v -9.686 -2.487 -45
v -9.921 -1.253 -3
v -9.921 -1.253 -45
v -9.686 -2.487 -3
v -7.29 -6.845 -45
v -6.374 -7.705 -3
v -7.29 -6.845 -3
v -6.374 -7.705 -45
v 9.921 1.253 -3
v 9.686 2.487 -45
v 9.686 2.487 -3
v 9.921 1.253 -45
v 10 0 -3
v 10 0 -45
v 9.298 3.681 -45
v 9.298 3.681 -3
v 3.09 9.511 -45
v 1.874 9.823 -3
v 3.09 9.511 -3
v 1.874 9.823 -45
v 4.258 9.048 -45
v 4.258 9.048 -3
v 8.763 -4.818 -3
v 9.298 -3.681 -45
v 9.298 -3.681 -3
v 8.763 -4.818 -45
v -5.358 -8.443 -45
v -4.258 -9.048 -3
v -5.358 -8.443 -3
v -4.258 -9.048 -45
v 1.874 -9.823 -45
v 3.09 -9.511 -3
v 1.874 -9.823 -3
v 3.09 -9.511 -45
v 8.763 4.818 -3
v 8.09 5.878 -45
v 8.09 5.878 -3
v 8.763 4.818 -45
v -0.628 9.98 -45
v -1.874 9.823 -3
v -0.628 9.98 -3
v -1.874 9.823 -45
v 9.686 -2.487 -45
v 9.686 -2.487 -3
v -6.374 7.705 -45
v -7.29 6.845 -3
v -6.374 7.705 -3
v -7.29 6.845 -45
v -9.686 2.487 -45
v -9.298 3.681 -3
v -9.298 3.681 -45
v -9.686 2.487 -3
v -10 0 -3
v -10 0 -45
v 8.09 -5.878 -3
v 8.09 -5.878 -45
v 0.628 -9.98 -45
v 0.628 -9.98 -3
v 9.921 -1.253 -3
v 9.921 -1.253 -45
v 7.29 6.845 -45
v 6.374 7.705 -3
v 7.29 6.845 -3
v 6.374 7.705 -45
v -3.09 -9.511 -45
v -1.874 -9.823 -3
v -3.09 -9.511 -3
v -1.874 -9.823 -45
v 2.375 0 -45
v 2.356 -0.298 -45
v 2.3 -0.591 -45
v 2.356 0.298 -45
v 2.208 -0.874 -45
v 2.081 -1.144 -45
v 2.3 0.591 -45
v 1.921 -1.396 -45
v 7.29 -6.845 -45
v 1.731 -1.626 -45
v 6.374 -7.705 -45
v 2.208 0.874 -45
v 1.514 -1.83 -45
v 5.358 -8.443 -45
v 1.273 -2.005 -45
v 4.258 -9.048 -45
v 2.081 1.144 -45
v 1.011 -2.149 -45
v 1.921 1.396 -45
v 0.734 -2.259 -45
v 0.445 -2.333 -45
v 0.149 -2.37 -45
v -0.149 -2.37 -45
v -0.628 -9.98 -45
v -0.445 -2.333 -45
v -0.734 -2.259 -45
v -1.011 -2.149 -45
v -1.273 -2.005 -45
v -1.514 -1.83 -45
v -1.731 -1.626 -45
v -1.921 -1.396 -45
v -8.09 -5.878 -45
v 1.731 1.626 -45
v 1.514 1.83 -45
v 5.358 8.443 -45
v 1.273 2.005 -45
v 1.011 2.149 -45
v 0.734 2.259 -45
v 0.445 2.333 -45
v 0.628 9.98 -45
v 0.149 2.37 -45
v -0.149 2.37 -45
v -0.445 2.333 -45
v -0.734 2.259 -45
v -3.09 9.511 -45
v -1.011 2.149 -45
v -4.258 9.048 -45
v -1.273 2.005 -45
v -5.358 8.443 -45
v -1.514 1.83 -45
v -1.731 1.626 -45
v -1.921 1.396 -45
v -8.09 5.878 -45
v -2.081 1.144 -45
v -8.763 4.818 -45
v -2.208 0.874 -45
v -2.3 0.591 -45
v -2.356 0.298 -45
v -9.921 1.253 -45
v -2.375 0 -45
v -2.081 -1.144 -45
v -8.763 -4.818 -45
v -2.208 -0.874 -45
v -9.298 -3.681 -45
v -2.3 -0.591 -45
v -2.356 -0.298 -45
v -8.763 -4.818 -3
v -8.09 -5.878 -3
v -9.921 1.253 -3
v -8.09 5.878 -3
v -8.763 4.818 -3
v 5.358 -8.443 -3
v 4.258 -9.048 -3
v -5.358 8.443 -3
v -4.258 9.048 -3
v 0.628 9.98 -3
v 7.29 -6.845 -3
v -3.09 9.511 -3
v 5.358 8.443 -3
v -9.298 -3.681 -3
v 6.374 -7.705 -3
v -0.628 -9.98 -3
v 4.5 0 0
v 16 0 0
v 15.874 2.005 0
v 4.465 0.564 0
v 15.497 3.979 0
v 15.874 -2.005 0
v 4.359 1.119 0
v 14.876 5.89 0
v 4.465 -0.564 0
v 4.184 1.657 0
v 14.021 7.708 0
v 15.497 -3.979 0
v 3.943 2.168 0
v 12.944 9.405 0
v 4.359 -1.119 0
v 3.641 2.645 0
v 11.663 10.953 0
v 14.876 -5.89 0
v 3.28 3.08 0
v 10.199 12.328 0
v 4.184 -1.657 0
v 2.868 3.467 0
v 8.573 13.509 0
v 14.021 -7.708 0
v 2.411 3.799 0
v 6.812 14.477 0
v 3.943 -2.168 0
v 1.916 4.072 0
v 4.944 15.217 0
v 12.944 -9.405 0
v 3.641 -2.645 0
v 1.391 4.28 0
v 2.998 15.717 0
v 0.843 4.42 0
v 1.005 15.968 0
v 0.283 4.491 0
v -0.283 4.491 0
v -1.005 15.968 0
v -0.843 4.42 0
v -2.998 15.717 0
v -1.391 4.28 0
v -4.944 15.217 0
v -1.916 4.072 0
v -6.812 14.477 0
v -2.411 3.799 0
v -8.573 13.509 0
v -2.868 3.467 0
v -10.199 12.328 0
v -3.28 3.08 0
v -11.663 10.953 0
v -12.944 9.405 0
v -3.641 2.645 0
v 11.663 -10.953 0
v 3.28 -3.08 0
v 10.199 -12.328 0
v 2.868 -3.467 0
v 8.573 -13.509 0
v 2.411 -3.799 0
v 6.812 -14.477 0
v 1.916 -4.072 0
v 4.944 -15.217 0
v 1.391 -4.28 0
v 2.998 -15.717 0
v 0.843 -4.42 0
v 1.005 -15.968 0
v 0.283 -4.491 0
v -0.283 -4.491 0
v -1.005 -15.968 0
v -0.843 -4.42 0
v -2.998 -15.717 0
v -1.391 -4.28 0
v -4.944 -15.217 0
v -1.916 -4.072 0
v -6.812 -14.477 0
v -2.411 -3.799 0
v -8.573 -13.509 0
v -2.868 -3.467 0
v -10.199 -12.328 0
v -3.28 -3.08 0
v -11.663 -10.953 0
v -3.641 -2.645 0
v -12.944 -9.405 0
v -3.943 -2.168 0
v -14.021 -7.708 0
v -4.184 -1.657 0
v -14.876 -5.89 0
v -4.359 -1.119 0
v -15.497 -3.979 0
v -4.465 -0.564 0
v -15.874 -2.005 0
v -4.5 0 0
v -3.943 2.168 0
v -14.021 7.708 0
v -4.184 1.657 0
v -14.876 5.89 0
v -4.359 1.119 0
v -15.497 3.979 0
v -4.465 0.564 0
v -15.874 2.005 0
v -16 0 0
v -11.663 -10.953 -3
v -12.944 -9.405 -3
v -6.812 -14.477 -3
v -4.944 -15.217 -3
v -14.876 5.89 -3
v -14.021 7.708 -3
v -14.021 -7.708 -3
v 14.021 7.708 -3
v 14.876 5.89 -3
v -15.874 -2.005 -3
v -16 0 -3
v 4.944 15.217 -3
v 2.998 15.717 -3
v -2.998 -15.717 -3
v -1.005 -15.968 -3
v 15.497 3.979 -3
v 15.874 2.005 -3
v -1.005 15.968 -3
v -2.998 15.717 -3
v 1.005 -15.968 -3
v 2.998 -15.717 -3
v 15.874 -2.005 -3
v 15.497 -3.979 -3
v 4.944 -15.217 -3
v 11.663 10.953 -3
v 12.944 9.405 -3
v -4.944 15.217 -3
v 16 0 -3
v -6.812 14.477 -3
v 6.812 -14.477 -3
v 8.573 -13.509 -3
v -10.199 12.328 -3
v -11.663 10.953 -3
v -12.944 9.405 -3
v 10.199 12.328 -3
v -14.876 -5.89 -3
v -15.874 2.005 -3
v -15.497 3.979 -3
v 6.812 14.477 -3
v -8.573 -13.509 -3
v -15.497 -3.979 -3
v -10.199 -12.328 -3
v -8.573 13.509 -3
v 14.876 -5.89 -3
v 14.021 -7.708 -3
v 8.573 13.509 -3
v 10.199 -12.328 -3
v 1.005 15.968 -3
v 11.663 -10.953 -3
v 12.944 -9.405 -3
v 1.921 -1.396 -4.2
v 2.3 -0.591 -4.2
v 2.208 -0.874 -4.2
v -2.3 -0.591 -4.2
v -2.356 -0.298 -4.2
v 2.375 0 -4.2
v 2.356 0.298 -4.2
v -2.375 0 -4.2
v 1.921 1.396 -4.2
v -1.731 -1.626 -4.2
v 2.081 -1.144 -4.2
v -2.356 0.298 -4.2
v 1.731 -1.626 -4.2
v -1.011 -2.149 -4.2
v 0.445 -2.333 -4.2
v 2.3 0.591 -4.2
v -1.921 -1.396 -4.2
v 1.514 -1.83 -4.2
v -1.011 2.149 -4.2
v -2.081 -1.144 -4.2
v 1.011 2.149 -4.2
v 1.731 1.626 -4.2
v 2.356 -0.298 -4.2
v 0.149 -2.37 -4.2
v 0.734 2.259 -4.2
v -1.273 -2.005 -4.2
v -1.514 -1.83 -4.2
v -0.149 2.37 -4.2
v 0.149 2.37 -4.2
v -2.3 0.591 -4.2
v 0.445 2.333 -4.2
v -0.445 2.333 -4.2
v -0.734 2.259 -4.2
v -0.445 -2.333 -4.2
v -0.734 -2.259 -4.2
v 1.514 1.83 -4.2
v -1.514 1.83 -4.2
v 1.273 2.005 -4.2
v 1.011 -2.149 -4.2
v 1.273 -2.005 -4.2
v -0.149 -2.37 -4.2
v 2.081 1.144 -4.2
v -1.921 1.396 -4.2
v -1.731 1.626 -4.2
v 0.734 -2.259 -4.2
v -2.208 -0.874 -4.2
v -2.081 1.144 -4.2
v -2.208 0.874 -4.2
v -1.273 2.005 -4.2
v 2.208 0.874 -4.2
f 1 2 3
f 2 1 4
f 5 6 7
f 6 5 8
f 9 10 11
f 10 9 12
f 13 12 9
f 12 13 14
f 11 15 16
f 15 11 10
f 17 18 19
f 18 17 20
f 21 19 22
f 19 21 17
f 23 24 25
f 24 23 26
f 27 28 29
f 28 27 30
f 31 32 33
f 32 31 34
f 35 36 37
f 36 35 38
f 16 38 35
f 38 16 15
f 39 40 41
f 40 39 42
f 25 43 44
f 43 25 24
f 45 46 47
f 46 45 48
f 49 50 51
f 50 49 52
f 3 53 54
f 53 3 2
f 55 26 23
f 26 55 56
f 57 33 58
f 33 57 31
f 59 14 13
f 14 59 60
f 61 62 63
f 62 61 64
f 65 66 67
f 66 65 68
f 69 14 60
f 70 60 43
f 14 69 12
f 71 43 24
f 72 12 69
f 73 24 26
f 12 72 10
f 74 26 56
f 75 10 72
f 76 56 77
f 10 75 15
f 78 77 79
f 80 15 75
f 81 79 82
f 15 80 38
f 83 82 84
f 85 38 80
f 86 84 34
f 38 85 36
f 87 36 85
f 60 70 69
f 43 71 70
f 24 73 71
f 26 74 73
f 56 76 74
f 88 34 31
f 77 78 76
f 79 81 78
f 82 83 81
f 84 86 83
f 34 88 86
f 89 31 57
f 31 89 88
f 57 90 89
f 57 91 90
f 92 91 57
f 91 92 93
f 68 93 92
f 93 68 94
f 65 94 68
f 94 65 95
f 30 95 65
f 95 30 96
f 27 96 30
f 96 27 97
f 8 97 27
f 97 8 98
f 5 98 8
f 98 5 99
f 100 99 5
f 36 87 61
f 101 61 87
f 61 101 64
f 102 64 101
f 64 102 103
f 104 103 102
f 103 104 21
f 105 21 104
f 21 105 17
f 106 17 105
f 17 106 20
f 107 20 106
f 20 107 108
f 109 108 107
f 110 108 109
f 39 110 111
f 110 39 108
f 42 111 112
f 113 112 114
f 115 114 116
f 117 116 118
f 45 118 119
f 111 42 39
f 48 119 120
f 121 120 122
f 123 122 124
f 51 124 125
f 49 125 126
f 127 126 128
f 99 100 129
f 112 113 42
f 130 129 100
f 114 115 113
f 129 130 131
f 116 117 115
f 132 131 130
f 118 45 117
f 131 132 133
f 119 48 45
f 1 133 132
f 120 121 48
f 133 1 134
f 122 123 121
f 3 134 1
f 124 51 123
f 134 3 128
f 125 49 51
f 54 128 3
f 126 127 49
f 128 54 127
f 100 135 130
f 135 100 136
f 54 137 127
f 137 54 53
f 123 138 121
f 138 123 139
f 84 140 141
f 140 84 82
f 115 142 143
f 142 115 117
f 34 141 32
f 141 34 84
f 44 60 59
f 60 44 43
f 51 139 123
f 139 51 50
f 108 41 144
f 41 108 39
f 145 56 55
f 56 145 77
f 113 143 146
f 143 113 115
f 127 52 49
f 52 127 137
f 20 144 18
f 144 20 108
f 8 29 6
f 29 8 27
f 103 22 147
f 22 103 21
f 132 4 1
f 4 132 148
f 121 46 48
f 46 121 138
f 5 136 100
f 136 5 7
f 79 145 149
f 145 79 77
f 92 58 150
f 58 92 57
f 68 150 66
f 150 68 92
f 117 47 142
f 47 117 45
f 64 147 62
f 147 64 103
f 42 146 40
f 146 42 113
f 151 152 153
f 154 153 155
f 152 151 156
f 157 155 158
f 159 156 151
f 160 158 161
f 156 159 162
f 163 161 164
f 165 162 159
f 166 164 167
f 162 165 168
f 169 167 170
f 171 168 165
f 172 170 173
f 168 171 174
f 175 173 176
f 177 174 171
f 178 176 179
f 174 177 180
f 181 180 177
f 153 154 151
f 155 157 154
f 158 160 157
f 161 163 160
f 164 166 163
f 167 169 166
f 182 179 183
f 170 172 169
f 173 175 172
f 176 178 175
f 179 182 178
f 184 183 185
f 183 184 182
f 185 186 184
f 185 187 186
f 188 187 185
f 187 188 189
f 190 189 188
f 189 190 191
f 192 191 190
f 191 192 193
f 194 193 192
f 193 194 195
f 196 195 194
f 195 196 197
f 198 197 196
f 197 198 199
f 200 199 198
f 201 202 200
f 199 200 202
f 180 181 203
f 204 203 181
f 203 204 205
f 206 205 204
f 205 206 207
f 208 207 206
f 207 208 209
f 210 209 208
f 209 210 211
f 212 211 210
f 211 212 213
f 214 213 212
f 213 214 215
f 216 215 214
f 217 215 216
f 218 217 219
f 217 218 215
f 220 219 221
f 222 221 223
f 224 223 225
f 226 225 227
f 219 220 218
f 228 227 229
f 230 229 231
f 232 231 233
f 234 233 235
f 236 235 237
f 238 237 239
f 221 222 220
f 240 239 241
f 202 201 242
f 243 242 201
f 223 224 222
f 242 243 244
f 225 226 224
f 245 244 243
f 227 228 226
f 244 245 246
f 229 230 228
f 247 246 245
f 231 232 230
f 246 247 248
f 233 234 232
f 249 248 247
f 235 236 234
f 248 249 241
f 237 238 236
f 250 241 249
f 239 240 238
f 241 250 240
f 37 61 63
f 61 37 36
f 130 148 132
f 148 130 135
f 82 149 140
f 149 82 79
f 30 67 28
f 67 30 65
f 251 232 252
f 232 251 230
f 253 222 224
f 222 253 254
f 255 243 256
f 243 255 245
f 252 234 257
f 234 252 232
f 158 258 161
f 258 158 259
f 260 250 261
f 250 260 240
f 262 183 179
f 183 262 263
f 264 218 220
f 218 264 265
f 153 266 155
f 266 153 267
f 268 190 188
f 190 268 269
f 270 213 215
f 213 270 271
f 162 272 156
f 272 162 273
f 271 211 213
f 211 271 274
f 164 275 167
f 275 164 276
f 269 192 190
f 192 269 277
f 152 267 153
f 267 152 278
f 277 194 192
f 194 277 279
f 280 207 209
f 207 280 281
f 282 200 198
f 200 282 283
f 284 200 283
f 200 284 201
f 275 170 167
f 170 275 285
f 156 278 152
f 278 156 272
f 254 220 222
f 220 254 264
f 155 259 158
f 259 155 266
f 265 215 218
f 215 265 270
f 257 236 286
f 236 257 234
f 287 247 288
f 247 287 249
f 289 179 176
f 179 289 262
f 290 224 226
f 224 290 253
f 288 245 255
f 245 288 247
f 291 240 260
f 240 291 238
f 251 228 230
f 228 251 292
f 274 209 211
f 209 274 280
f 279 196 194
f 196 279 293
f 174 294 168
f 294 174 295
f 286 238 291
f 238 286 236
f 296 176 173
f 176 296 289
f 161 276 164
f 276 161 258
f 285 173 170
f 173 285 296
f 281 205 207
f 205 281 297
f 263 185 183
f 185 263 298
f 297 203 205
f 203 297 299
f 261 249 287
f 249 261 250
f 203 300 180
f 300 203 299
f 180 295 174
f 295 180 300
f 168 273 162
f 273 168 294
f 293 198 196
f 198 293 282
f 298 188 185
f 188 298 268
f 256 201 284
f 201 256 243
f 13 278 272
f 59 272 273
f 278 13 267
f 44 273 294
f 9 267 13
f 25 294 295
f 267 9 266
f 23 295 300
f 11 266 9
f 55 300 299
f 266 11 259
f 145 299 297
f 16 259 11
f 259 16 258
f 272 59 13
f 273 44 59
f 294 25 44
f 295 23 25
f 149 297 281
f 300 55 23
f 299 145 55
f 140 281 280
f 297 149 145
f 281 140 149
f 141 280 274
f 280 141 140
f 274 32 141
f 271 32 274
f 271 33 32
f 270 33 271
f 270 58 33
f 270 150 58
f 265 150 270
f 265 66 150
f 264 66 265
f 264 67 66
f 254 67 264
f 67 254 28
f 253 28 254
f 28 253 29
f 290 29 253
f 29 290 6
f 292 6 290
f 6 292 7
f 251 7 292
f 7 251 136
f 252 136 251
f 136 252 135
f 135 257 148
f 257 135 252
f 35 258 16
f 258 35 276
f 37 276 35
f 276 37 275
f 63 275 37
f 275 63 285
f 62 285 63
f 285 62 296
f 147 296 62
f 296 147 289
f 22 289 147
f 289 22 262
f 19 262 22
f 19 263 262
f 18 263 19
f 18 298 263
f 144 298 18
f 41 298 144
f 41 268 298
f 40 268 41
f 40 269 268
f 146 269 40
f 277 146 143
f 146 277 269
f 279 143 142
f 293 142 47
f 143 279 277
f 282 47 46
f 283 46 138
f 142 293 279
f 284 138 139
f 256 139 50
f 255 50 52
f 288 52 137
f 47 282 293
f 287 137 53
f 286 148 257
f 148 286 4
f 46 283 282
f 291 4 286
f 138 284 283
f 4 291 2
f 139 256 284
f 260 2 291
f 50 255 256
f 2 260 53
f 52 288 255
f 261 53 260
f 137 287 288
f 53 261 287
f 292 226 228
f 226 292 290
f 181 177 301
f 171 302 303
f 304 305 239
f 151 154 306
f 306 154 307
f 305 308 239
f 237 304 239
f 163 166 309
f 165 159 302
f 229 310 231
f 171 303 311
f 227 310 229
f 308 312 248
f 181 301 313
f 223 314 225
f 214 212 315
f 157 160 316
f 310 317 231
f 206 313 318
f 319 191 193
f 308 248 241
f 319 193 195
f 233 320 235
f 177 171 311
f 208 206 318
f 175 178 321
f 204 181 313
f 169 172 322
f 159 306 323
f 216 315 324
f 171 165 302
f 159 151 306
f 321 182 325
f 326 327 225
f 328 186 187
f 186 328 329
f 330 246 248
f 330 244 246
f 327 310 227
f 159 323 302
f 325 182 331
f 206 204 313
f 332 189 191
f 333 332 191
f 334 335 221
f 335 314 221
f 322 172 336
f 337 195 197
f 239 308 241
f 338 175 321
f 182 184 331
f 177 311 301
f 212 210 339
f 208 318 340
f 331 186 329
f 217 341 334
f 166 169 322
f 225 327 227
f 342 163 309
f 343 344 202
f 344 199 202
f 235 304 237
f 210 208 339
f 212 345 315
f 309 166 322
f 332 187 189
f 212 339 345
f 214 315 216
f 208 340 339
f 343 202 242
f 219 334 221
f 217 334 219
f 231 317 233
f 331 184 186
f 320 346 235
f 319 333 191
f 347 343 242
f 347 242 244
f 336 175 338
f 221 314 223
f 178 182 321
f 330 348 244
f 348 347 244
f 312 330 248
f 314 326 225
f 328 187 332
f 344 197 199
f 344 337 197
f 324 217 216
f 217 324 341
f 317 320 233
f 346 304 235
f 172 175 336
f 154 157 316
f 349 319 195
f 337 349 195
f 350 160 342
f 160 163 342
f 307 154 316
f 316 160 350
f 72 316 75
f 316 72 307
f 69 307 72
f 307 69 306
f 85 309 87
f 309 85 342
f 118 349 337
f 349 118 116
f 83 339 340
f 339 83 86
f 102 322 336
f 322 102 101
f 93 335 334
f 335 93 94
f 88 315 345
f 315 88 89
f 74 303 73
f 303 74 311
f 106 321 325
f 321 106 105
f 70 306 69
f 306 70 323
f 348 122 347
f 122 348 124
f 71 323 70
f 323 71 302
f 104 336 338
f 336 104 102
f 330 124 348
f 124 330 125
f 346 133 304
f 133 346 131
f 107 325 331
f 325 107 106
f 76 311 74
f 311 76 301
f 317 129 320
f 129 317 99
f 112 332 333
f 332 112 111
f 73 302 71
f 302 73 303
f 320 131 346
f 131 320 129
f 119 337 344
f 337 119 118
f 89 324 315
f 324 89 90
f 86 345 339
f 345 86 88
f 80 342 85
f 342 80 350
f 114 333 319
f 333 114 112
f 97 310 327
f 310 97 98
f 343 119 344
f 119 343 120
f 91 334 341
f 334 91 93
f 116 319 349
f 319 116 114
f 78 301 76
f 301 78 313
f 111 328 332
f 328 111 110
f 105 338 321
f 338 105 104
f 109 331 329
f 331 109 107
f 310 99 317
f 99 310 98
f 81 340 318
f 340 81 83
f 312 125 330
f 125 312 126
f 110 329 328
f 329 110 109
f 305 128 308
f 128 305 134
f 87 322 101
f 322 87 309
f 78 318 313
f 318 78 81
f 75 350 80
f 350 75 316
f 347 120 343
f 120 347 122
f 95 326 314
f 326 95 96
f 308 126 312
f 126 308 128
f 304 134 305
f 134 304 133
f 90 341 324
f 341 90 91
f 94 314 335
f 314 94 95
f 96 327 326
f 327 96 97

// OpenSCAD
$fn = 50;


difference() {
	union() {
		translate(v = [0, 0, -45.0000000000]) {
			cylinder(h = 45, r = 10.0000000000);
		}
		translate(v = [0, 0, -3.0000000000]) {
			cylinder(h = 3, r = 16.0000000000);
		}
	}
	union() {
		translate(v = [0, 0, 0]) {
			rotate(a = [0, 0, 0]) {
				difference() {
					union() {
						#translate(v = [0, 0, -45.0000000000]) {
							cylinder(h = 45, r = 2.2500000000);
						}
						#translate(v = [0, 0, -4.2000000000]) {
							cylinder(h = 4.2000000000, r1 = 2.3750000000, r2 = 4.5000000000);
						}
						#translate(v = [0, 0, -45.0000000000]) {
							cylinder(h = 45, r = 2.3750000000);
						}
						#translate(v = [0, 0, -45.0000000000]) {
							cylinder(h = 45, r = 2.2500000000);
						}
					}
					union();
				}
			}
		}
	}
}
